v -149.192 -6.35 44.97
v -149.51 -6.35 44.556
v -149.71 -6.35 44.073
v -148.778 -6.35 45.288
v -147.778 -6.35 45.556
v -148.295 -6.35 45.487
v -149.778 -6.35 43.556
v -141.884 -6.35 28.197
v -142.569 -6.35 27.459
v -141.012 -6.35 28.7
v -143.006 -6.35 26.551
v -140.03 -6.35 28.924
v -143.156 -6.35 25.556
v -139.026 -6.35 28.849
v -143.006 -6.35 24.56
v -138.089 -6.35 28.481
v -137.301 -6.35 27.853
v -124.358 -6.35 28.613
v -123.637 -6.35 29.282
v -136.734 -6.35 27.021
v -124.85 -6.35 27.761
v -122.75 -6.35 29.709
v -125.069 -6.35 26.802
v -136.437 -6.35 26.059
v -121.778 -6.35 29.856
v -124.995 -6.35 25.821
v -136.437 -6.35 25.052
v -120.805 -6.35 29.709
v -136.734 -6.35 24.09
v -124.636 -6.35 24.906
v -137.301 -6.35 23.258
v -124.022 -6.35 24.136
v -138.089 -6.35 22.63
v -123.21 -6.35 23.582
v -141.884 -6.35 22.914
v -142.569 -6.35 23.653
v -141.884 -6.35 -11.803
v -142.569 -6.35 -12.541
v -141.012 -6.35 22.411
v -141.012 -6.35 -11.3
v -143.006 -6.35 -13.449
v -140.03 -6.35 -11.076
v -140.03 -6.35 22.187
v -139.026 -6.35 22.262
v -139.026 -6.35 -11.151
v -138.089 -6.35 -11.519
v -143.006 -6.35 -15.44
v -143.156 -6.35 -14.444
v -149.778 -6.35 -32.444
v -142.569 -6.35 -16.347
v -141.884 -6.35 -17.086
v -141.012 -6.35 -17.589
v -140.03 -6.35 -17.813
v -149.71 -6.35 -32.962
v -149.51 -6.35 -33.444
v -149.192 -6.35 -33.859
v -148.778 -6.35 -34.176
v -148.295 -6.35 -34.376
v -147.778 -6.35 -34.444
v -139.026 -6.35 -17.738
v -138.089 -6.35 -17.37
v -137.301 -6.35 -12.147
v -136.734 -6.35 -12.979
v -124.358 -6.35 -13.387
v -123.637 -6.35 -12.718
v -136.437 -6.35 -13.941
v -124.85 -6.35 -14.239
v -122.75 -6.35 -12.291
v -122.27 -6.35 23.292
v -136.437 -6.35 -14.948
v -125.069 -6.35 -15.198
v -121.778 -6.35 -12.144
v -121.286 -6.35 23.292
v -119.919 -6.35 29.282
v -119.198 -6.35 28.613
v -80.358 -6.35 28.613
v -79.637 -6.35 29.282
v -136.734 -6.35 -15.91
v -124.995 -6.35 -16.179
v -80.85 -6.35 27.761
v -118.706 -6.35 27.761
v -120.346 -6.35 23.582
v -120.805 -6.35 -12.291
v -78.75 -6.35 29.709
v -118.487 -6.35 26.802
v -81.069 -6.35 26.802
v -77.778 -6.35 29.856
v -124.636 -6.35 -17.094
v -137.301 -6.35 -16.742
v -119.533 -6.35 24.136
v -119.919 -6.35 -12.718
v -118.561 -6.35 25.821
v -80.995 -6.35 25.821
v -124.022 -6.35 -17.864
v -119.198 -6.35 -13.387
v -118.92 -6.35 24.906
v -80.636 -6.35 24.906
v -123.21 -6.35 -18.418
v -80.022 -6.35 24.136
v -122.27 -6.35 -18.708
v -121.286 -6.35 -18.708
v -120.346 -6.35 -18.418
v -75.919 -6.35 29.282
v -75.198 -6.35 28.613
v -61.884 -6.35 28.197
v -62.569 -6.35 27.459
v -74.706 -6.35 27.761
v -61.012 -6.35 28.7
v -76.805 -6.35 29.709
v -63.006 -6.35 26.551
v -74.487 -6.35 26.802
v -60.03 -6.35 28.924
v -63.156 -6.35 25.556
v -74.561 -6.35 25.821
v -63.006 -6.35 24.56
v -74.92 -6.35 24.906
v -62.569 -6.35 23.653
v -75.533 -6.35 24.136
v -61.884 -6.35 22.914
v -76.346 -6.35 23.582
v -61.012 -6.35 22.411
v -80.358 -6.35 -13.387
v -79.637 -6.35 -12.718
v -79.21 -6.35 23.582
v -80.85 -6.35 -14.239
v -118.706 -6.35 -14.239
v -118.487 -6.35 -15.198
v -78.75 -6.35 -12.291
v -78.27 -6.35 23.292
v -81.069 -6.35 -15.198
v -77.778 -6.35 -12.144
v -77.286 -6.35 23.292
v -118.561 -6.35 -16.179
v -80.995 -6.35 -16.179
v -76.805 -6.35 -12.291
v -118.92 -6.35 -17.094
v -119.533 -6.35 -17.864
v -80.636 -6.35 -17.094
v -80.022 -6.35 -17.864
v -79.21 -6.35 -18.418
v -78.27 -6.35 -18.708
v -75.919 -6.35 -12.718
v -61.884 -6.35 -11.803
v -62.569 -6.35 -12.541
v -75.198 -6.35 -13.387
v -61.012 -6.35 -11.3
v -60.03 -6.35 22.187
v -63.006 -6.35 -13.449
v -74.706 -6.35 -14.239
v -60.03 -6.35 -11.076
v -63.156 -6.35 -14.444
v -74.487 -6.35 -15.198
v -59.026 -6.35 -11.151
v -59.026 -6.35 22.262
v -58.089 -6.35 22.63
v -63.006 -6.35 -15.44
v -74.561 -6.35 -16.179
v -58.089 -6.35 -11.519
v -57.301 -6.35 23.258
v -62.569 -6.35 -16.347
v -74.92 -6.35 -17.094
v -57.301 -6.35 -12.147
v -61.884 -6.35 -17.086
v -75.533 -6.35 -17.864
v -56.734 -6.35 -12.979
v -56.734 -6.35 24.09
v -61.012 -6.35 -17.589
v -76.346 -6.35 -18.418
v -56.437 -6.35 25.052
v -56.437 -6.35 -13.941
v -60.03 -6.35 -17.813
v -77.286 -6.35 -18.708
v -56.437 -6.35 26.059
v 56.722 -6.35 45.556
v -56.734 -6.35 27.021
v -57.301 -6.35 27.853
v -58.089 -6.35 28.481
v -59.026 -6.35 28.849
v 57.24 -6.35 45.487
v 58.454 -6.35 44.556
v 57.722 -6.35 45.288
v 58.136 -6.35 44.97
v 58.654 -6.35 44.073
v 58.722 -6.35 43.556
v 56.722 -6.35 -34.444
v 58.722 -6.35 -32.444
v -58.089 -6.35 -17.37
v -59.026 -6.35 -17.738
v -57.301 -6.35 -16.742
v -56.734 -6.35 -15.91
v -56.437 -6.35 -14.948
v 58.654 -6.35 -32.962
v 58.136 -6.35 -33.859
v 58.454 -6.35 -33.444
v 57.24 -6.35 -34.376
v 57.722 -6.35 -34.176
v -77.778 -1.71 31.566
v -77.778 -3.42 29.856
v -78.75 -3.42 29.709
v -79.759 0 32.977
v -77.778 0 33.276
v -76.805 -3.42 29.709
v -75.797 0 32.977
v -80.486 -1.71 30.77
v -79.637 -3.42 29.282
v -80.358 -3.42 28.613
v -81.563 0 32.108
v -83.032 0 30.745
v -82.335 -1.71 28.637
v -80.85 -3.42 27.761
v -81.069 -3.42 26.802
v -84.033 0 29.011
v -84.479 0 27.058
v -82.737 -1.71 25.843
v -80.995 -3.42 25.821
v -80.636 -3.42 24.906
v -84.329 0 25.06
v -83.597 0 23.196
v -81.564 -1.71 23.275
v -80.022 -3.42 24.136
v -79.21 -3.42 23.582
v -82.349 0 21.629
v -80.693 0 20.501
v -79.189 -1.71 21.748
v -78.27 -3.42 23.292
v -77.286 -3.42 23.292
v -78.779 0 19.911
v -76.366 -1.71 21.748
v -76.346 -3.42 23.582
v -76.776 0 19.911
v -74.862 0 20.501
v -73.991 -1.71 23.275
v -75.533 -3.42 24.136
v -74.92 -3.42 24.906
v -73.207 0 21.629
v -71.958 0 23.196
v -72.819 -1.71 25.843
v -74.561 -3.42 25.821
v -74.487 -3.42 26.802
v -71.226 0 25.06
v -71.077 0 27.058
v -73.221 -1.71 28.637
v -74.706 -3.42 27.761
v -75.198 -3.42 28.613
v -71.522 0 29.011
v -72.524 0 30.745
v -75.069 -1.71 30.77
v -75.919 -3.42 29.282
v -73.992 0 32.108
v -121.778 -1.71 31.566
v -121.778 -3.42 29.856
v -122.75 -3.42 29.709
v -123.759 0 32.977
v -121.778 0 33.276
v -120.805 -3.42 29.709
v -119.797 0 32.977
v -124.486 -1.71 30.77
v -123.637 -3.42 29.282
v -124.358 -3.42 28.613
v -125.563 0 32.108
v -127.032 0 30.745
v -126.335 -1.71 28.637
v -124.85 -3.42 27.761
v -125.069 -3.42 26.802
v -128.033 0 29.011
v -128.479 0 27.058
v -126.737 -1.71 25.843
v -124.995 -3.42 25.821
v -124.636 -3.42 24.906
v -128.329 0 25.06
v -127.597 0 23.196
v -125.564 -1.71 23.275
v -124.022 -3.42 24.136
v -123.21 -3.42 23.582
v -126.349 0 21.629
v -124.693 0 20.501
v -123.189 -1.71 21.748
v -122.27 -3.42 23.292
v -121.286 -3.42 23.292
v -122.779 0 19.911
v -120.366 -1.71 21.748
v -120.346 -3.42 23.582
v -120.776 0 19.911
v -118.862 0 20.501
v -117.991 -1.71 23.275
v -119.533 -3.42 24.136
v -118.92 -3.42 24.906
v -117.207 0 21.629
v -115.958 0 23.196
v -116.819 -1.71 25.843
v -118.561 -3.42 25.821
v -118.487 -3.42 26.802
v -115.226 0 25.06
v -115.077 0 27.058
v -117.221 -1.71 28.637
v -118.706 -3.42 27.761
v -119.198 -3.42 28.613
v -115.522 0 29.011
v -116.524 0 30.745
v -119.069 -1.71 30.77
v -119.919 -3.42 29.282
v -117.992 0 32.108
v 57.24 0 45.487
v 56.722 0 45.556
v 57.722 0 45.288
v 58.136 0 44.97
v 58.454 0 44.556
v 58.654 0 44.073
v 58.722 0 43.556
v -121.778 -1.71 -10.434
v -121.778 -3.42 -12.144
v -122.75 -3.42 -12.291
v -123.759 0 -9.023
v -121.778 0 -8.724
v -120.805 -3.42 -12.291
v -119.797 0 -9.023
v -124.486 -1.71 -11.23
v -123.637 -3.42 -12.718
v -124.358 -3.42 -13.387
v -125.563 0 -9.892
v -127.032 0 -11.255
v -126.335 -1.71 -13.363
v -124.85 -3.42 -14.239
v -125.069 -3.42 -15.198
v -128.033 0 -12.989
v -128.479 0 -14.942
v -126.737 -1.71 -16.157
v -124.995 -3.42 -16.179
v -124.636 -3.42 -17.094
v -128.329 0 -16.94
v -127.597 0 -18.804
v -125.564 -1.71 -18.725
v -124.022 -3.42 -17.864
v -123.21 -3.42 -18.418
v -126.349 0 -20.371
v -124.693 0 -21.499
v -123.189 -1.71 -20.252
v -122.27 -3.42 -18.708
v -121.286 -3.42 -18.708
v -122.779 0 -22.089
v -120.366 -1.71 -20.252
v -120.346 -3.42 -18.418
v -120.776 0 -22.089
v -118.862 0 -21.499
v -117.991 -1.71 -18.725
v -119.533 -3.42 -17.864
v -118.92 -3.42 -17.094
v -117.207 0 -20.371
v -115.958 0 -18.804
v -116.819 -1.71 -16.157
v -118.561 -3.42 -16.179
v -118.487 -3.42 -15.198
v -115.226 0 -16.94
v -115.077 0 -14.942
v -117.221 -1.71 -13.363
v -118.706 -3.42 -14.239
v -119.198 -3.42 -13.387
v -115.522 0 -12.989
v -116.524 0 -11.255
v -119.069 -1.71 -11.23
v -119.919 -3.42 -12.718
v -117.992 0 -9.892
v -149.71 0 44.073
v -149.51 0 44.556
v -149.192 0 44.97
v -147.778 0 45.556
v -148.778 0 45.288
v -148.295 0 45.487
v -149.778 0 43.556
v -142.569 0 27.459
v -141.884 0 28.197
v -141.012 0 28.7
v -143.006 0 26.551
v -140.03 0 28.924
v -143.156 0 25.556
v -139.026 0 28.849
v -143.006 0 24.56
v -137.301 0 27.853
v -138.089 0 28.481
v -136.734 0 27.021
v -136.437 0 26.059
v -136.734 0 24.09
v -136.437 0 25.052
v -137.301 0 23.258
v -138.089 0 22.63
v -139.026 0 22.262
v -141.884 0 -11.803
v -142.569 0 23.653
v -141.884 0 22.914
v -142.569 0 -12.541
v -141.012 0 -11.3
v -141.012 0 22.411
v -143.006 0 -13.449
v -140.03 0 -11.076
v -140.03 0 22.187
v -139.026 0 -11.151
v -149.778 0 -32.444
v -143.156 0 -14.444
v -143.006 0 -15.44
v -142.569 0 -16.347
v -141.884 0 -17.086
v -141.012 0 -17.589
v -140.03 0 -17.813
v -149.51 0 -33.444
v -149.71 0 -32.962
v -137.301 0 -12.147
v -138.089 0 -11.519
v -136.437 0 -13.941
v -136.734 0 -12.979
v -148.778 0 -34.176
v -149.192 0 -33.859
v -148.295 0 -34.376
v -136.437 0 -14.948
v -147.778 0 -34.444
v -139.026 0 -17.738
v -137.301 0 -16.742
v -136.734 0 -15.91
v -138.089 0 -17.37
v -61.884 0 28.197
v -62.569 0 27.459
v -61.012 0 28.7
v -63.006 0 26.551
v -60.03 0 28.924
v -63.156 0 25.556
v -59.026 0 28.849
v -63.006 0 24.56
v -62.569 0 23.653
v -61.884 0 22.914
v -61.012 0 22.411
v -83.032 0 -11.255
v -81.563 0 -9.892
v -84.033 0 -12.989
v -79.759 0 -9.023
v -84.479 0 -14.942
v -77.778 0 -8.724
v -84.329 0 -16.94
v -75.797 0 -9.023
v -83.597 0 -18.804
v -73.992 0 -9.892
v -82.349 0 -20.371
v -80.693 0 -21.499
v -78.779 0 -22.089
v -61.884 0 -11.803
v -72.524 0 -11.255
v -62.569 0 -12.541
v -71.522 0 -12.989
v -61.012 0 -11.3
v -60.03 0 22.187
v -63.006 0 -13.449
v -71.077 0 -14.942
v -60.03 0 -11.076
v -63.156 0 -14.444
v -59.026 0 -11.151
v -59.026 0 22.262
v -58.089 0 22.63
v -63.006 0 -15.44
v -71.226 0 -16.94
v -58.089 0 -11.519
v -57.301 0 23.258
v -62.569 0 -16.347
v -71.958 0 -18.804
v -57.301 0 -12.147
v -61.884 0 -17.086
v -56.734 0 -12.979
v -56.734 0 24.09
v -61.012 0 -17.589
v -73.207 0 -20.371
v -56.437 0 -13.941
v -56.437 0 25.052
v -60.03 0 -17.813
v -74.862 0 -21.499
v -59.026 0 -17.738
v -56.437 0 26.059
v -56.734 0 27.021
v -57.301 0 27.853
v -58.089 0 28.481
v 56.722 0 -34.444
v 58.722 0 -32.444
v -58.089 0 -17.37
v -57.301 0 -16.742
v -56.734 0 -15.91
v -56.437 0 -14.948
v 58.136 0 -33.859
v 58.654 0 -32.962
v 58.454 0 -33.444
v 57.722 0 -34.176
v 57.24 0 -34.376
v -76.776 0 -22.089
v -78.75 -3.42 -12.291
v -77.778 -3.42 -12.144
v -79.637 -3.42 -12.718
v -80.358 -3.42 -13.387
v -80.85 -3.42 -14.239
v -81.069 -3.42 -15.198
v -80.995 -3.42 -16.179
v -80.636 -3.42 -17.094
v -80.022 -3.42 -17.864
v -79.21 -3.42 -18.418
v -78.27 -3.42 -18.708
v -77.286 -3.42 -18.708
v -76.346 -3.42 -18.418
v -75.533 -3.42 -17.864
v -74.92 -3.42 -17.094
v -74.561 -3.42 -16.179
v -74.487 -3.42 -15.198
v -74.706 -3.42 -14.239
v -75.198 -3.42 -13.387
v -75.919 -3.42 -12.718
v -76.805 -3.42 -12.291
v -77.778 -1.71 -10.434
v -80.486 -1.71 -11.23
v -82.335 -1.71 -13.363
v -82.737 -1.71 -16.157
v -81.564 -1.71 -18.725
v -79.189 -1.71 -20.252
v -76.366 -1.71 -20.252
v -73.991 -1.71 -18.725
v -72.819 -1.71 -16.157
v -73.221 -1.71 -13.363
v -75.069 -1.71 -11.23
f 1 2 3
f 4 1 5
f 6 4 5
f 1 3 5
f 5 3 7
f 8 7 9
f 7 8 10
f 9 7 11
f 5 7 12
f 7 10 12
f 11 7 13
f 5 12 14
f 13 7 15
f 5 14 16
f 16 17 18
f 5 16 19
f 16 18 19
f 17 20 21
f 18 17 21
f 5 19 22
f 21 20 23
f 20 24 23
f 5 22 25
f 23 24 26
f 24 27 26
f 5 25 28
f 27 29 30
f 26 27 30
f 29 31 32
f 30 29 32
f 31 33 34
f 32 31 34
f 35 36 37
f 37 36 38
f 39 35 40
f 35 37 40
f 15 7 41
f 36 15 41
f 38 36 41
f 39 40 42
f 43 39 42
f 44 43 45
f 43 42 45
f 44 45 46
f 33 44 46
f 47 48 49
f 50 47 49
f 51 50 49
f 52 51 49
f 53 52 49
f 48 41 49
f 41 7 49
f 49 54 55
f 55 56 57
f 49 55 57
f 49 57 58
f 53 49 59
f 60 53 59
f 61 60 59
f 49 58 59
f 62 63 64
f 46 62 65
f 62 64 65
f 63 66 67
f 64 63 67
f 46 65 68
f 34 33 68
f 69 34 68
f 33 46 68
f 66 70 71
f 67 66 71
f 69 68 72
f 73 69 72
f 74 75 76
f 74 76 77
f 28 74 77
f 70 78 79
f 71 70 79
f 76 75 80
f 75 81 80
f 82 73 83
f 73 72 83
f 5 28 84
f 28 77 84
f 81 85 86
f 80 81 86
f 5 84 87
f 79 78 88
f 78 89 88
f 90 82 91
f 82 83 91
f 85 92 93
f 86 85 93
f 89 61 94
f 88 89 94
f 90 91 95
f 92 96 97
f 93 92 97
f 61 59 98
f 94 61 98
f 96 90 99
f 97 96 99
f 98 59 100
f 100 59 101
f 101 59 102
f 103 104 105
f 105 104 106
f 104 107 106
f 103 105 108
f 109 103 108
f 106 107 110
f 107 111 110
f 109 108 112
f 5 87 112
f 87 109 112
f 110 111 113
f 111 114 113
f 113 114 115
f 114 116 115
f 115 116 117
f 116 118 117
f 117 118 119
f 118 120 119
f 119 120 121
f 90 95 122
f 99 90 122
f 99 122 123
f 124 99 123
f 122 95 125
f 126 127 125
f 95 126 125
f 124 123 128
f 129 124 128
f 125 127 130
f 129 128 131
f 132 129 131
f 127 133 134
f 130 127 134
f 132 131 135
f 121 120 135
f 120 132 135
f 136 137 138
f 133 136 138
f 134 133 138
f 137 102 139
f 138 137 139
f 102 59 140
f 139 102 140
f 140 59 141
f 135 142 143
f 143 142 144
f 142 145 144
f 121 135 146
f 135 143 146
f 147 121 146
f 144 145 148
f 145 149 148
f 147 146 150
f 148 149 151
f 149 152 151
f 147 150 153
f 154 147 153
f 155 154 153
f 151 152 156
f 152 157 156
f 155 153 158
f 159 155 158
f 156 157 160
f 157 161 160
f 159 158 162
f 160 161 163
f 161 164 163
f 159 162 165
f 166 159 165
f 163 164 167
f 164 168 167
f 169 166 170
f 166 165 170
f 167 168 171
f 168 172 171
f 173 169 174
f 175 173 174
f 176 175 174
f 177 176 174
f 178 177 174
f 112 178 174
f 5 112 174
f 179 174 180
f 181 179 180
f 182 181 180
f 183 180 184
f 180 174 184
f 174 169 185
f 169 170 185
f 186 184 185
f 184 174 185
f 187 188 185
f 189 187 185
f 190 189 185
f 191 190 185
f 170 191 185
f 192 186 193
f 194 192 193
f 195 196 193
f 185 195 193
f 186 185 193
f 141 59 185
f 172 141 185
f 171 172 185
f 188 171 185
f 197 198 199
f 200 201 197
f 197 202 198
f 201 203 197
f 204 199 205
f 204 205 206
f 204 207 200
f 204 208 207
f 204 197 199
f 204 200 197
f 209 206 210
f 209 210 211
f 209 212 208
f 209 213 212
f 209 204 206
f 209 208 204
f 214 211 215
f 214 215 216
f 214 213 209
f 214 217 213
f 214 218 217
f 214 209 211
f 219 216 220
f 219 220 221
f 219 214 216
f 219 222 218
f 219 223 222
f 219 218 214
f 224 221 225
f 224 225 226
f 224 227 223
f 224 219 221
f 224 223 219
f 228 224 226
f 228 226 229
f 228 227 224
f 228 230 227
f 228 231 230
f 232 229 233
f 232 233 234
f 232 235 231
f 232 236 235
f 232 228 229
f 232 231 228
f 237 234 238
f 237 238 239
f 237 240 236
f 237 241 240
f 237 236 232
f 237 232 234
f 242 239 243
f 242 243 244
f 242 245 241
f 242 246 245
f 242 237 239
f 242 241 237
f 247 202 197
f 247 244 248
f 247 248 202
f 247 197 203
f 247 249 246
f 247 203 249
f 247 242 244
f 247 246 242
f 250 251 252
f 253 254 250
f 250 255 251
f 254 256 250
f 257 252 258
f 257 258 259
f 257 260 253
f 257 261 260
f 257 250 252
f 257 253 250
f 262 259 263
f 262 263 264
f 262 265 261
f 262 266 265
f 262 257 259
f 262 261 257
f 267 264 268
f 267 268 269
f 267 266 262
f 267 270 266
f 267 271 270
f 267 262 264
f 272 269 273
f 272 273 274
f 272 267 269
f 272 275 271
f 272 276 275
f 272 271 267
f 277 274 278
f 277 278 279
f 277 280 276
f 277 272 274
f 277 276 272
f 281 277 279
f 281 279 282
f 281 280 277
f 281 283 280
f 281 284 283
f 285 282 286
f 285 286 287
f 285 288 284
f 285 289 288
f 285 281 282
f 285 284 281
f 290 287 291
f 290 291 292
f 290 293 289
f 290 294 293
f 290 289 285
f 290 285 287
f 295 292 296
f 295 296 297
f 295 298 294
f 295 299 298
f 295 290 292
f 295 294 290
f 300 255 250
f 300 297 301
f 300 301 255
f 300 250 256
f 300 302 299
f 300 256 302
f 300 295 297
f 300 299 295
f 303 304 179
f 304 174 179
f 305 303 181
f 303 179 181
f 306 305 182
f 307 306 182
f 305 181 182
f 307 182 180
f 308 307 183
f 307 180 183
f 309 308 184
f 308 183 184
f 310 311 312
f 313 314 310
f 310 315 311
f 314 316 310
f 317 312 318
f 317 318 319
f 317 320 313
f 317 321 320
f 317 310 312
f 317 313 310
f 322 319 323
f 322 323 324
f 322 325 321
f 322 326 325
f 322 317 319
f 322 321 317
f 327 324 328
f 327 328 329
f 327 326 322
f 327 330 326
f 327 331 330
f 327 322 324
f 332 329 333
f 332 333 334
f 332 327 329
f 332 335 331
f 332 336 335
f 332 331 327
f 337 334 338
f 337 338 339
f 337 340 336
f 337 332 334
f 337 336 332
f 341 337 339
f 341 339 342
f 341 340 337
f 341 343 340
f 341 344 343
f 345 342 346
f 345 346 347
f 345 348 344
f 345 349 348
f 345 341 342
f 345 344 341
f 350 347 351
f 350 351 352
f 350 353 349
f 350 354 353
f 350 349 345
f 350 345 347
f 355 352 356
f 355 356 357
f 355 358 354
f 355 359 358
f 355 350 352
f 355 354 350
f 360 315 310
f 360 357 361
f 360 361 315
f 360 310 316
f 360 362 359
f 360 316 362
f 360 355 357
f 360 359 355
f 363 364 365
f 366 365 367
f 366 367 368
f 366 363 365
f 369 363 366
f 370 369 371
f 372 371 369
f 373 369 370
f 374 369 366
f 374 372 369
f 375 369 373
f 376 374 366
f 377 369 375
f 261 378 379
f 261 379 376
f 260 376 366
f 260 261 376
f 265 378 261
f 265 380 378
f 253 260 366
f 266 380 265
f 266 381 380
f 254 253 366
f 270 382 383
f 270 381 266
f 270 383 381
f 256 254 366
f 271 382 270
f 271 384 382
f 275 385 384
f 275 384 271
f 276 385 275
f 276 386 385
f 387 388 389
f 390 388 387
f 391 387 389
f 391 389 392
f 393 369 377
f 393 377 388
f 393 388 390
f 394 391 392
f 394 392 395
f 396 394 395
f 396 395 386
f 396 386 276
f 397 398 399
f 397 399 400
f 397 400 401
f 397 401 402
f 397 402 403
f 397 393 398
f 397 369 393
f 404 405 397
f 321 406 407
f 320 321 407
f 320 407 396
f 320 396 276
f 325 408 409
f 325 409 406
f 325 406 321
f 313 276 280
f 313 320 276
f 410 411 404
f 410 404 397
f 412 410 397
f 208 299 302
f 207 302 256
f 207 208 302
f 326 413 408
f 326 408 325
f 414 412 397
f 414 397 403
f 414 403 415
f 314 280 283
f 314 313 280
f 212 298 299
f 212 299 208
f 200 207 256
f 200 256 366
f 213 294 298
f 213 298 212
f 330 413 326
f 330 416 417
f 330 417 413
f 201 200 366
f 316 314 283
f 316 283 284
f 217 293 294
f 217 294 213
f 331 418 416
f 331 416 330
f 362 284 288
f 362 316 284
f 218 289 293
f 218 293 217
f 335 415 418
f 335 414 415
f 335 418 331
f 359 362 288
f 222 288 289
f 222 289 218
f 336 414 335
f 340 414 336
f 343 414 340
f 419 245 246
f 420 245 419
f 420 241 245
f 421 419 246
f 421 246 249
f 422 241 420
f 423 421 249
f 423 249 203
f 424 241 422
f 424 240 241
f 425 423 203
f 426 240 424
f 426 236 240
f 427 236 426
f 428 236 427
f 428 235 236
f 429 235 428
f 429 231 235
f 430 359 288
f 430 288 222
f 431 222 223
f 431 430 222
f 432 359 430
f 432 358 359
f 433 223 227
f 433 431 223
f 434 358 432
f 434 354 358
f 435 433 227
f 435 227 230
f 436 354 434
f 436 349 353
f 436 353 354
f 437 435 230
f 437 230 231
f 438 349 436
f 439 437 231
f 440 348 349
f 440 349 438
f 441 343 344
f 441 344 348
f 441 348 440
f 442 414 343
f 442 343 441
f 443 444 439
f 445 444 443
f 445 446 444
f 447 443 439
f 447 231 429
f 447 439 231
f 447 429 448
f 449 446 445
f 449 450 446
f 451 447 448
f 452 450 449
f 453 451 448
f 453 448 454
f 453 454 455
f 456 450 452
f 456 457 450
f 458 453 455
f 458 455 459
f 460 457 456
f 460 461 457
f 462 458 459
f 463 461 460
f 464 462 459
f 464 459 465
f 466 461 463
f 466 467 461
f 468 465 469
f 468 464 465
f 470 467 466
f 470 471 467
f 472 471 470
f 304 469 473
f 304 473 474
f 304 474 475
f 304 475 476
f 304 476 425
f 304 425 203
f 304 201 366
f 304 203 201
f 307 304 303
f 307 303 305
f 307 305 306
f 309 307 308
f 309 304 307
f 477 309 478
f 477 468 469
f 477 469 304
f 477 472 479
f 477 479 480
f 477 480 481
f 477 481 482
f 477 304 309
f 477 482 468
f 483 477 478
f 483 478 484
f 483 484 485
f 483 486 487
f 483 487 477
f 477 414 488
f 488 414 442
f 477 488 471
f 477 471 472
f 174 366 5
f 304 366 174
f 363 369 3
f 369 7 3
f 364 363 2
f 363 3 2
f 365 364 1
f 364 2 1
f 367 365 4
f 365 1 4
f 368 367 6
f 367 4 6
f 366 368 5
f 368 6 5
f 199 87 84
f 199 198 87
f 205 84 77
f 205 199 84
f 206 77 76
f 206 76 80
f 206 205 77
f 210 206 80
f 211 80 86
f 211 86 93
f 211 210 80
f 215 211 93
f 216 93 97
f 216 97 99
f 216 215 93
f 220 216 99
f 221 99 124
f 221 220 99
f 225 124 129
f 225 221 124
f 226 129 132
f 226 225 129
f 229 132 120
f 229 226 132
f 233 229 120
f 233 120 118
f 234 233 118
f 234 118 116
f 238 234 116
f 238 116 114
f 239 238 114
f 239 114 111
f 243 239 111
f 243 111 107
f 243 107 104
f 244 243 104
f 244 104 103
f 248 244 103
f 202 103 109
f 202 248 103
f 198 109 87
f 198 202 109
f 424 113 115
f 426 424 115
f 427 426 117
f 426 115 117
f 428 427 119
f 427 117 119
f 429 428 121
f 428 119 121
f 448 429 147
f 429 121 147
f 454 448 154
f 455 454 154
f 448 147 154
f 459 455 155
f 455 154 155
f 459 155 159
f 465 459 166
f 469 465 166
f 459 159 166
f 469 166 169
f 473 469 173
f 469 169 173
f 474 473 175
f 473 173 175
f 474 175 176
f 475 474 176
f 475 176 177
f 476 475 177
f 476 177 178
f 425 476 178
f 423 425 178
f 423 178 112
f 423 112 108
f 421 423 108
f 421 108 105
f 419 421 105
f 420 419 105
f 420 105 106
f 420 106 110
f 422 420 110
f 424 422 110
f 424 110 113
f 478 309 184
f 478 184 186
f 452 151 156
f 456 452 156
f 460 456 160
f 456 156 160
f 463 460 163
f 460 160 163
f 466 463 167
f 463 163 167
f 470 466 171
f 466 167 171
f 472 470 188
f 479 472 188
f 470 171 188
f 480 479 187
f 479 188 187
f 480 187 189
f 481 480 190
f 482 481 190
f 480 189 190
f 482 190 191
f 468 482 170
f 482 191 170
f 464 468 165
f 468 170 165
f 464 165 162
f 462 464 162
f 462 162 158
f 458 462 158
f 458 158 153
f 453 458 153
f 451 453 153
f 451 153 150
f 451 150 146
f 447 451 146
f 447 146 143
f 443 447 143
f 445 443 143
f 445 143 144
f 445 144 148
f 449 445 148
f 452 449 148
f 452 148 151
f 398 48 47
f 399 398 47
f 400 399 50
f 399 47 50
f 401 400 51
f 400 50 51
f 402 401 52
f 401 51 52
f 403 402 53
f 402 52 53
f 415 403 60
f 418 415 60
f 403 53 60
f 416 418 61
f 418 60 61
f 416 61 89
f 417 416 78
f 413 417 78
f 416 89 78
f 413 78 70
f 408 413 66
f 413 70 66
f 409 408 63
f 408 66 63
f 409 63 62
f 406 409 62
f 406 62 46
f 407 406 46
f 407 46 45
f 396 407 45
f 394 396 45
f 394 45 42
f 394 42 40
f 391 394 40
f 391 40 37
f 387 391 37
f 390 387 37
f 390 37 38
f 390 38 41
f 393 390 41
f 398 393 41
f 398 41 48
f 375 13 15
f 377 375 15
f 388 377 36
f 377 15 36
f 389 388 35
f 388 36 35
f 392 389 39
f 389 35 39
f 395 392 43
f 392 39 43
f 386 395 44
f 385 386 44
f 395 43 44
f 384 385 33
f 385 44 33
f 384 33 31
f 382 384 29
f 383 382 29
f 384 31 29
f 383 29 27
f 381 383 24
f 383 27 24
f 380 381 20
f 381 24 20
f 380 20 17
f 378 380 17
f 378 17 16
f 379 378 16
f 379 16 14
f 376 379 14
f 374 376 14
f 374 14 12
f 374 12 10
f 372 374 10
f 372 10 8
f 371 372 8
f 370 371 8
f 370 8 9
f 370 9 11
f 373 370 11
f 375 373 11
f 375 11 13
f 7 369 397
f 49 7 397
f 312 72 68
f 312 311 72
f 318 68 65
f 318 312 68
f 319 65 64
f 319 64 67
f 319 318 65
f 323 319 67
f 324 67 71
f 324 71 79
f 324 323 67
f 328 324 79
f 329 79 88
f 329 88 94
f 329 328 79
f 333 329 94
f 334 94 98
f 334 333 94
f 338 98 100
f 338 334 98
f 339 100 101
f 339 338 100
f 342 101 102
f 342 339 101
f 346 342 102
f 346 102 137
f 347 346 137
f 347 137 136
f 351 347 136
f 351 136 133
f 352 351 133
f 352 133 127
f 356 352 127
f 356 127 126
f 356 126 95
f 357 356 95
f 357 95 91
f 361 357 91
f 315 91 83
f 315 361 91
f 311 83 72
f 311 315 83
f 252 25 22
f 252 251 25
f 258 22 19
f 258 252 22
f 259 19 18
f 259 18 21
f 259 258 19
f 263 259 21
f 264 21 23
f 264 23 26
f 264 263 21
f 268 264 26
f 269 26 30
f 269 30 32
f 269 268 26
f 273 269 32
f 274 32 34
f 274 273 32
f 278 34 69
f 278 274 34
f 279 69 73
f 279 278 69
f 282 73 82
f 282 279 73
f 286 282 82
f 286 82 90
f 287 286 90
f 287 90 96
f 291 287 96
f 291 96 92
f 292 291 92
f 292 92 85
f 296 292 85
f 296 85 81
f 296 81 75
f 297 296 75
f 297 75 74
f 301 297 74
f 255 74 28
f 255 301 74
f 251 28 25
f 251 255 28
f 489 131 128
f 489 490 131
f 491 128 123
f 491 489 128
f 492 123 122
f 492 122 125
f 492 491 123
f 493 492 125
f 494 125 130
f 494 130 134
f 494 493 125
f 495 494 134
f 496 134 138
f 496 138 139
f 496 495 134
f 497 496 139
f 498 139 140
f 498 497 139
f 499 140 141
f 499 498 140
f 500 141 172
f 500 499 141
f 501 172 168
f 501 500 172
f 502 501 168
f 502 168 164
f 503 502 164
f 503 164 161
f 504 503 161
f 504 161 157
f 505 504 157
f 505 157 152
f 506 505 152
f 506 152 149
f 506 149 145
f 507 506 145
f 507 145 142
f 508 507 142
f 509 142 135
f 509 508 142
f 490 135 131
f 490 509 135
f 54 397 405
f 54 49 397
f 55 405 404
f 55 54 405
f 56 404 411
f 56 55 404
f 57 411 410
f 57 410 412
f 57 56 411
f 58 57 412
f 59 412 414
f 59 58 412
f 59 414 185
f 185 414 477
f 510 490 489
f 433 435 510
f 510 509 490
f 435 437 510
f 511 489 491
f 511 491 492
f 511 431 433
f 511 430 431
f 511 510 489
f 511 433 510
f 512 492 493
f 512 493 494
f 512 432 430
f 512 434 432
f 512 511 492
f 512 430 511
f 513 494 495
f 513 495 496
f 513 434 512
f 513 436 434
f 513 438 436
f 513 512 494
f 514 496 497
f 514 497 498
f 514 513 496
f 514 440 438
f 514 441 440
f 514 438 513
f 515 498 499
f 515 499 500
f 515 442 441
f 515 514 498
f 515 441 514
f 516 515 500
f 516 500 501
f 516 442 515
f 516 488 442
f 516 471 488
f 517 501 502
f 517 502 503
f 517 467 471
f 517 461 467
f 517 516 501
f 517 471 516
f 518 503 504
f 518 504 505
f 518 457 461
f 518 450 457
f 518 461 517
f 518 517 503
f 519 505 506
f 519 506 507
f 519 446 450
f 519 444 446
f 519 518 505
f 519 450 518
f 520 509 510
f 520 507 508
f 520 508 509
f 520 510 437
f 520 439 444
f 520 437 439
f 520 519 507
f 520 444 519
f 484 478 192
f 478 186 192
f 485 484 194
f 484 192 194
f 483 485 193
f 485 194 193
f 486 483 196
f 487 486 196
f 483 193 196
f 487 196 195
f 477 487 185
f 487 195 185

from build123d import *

# Parameters (mm, degrees)
CROQUIS1_W                                   = 208.5
CROQUIS1_H                                   = 80
BRIDA_BASE1_DEPTH                            = 6.35
REDONDEO1_R                                  = 2
TALADRO_DE_MARGEN_PARA_1_41_D                = 6.7564
REFRENTADO_PARA_TORNILLO_TAP_N_CON_C_2_COUNT = 2
REFRENTADO_PARA_TORNILLO_TAP_N_CON_C_2_PITCH = 44
REFRENTADO_PARA_TORNILLO_TAP_N_CON_C_3_COUNT = 2
REFRENTADO_PARA_TORNILLO_TAP_N_CON_C_3_PITCH = 60.827625303
REFRENTADO_PARA_TORNILLO_TAP_N_CON_C_4_COUNT = 2
REFRENTADO_PARA_TORNILLO_TAP_N_CON_C_4_PITCH = 42


# Sheet-metal steps are written as plain solids
with BuildPart() as part:
    # Croquis1 → Brida base1 (new body)
    with BuildSketch(Plane(origin=(0, 0, 0), x_dir=(1, 0, 0), z_dir=(0, 1, 0))):
        with Locations((-45.527777778, -5.555555556)):
            Rectangle(CROQUIS1_W, CROQUIS1_H)
    extrude(amount=-BRIDA_BASE1_DEPTH)

    # Redondeo1
    redondeo1_edges = [part.edges().sort_by_distance(p)[0] for p in [
        (-149.777777778, -3.175, -34.444444444),
        (58.722222222, -3.175, -34.444444444),
        (58.722222222, -3.175, 45.555555556),
        (-149.777777778, -3.175, 45.555555556),
    ]]
    fillet(redondeo1_edges, radius=REDONDEO1_R)

    # Taladro de margen para 1/41 (through all)
    with Locations(Plane(origin=(0, 0, 0), x_dir=(1, 0, 0), z_dir=(0, 1, 0))):
        with Locations((-139.777777778, -25.555555556), (-59.777777778, -25.555555556), (-139.777777778, 14.444444444), (-59.777777778, 14.444444444)):
            Hole(TALADRO_DE_MARGEN_PARA_1_41_D / 2)

    # Croquis9 → Refrentado para tornillo tapón con cabeza plana de clavija de M61 (revolve, cut)
    with BuildSketch(Plane(origin=(-121.777777778, 0, -15.444444444), x_dir=(0, 0, 1), z_dir=(1, 0, 0))):
        Polygon((0, 0), (0, 6.35), (3.3, 6.35), (3.3, 3.42), (6.72, 0), align=None)
    refrentado_para_tornillo_tap_n_con_cabez = revolve(axis=Axis((-121.777777778, 6.35, -15.444444444), (0, -1, 0)), mode=Mode.SUBTRACT)

    # Refrentado para tornillo tap_n con c 2: Refrentado para tornillo tapón con cabeza plana de clavija de M61 ×2
    with Locations(*[(i * REFRENTADO_PARA_TORNILLO_TAP_N_CON_C_2_PITCH, 0, 0) for i in range(1, REFRENTADO_PARA_TORNILLO_TAP_N_CON_C_2_COUNT)]):
        add(refrentado_para_tornillo_tap_n_con_cabez, mode=Mode.SUBTRACT)

    # Refrentado para tornillo tap_n con c 3: Refrentado para tornillo tapón con cabeza plana de clavija de M61 ×2
    with Locations(*[Vector(0.723355544143572, 0, 0.6904757466825007) * (i * REFRENTADO_PARA_TORNILLO_TAP_N_CON_C_3_PITCH) for i in range(1, REFRENTADO_PARA_TORNILLO_TAP_N_CON_C_3_COUNT)]):
        add(refrentado_para_tornillo_tap_n_con_cabez, mode=Mode.SUBTRACT)

    # Refrentado para tornillo tap_n con c 4: Refrentado para tornillo tapón con cabeza plana de clavija de M61 ×2
    with Locations(*[(0, 0, i * REFRENTADO_PARA_TORNILLO_TAP_N_CON_C_4_PITCH) for i in range(1, REFRENTADO_PARA_TORNILLO_TAP_N_CON_C_4_COUNT)]):
        add(refrentado_para_tornillo_tap_n_con_cabez, mode=Mode.SUBTRACT)


solid = part.part
